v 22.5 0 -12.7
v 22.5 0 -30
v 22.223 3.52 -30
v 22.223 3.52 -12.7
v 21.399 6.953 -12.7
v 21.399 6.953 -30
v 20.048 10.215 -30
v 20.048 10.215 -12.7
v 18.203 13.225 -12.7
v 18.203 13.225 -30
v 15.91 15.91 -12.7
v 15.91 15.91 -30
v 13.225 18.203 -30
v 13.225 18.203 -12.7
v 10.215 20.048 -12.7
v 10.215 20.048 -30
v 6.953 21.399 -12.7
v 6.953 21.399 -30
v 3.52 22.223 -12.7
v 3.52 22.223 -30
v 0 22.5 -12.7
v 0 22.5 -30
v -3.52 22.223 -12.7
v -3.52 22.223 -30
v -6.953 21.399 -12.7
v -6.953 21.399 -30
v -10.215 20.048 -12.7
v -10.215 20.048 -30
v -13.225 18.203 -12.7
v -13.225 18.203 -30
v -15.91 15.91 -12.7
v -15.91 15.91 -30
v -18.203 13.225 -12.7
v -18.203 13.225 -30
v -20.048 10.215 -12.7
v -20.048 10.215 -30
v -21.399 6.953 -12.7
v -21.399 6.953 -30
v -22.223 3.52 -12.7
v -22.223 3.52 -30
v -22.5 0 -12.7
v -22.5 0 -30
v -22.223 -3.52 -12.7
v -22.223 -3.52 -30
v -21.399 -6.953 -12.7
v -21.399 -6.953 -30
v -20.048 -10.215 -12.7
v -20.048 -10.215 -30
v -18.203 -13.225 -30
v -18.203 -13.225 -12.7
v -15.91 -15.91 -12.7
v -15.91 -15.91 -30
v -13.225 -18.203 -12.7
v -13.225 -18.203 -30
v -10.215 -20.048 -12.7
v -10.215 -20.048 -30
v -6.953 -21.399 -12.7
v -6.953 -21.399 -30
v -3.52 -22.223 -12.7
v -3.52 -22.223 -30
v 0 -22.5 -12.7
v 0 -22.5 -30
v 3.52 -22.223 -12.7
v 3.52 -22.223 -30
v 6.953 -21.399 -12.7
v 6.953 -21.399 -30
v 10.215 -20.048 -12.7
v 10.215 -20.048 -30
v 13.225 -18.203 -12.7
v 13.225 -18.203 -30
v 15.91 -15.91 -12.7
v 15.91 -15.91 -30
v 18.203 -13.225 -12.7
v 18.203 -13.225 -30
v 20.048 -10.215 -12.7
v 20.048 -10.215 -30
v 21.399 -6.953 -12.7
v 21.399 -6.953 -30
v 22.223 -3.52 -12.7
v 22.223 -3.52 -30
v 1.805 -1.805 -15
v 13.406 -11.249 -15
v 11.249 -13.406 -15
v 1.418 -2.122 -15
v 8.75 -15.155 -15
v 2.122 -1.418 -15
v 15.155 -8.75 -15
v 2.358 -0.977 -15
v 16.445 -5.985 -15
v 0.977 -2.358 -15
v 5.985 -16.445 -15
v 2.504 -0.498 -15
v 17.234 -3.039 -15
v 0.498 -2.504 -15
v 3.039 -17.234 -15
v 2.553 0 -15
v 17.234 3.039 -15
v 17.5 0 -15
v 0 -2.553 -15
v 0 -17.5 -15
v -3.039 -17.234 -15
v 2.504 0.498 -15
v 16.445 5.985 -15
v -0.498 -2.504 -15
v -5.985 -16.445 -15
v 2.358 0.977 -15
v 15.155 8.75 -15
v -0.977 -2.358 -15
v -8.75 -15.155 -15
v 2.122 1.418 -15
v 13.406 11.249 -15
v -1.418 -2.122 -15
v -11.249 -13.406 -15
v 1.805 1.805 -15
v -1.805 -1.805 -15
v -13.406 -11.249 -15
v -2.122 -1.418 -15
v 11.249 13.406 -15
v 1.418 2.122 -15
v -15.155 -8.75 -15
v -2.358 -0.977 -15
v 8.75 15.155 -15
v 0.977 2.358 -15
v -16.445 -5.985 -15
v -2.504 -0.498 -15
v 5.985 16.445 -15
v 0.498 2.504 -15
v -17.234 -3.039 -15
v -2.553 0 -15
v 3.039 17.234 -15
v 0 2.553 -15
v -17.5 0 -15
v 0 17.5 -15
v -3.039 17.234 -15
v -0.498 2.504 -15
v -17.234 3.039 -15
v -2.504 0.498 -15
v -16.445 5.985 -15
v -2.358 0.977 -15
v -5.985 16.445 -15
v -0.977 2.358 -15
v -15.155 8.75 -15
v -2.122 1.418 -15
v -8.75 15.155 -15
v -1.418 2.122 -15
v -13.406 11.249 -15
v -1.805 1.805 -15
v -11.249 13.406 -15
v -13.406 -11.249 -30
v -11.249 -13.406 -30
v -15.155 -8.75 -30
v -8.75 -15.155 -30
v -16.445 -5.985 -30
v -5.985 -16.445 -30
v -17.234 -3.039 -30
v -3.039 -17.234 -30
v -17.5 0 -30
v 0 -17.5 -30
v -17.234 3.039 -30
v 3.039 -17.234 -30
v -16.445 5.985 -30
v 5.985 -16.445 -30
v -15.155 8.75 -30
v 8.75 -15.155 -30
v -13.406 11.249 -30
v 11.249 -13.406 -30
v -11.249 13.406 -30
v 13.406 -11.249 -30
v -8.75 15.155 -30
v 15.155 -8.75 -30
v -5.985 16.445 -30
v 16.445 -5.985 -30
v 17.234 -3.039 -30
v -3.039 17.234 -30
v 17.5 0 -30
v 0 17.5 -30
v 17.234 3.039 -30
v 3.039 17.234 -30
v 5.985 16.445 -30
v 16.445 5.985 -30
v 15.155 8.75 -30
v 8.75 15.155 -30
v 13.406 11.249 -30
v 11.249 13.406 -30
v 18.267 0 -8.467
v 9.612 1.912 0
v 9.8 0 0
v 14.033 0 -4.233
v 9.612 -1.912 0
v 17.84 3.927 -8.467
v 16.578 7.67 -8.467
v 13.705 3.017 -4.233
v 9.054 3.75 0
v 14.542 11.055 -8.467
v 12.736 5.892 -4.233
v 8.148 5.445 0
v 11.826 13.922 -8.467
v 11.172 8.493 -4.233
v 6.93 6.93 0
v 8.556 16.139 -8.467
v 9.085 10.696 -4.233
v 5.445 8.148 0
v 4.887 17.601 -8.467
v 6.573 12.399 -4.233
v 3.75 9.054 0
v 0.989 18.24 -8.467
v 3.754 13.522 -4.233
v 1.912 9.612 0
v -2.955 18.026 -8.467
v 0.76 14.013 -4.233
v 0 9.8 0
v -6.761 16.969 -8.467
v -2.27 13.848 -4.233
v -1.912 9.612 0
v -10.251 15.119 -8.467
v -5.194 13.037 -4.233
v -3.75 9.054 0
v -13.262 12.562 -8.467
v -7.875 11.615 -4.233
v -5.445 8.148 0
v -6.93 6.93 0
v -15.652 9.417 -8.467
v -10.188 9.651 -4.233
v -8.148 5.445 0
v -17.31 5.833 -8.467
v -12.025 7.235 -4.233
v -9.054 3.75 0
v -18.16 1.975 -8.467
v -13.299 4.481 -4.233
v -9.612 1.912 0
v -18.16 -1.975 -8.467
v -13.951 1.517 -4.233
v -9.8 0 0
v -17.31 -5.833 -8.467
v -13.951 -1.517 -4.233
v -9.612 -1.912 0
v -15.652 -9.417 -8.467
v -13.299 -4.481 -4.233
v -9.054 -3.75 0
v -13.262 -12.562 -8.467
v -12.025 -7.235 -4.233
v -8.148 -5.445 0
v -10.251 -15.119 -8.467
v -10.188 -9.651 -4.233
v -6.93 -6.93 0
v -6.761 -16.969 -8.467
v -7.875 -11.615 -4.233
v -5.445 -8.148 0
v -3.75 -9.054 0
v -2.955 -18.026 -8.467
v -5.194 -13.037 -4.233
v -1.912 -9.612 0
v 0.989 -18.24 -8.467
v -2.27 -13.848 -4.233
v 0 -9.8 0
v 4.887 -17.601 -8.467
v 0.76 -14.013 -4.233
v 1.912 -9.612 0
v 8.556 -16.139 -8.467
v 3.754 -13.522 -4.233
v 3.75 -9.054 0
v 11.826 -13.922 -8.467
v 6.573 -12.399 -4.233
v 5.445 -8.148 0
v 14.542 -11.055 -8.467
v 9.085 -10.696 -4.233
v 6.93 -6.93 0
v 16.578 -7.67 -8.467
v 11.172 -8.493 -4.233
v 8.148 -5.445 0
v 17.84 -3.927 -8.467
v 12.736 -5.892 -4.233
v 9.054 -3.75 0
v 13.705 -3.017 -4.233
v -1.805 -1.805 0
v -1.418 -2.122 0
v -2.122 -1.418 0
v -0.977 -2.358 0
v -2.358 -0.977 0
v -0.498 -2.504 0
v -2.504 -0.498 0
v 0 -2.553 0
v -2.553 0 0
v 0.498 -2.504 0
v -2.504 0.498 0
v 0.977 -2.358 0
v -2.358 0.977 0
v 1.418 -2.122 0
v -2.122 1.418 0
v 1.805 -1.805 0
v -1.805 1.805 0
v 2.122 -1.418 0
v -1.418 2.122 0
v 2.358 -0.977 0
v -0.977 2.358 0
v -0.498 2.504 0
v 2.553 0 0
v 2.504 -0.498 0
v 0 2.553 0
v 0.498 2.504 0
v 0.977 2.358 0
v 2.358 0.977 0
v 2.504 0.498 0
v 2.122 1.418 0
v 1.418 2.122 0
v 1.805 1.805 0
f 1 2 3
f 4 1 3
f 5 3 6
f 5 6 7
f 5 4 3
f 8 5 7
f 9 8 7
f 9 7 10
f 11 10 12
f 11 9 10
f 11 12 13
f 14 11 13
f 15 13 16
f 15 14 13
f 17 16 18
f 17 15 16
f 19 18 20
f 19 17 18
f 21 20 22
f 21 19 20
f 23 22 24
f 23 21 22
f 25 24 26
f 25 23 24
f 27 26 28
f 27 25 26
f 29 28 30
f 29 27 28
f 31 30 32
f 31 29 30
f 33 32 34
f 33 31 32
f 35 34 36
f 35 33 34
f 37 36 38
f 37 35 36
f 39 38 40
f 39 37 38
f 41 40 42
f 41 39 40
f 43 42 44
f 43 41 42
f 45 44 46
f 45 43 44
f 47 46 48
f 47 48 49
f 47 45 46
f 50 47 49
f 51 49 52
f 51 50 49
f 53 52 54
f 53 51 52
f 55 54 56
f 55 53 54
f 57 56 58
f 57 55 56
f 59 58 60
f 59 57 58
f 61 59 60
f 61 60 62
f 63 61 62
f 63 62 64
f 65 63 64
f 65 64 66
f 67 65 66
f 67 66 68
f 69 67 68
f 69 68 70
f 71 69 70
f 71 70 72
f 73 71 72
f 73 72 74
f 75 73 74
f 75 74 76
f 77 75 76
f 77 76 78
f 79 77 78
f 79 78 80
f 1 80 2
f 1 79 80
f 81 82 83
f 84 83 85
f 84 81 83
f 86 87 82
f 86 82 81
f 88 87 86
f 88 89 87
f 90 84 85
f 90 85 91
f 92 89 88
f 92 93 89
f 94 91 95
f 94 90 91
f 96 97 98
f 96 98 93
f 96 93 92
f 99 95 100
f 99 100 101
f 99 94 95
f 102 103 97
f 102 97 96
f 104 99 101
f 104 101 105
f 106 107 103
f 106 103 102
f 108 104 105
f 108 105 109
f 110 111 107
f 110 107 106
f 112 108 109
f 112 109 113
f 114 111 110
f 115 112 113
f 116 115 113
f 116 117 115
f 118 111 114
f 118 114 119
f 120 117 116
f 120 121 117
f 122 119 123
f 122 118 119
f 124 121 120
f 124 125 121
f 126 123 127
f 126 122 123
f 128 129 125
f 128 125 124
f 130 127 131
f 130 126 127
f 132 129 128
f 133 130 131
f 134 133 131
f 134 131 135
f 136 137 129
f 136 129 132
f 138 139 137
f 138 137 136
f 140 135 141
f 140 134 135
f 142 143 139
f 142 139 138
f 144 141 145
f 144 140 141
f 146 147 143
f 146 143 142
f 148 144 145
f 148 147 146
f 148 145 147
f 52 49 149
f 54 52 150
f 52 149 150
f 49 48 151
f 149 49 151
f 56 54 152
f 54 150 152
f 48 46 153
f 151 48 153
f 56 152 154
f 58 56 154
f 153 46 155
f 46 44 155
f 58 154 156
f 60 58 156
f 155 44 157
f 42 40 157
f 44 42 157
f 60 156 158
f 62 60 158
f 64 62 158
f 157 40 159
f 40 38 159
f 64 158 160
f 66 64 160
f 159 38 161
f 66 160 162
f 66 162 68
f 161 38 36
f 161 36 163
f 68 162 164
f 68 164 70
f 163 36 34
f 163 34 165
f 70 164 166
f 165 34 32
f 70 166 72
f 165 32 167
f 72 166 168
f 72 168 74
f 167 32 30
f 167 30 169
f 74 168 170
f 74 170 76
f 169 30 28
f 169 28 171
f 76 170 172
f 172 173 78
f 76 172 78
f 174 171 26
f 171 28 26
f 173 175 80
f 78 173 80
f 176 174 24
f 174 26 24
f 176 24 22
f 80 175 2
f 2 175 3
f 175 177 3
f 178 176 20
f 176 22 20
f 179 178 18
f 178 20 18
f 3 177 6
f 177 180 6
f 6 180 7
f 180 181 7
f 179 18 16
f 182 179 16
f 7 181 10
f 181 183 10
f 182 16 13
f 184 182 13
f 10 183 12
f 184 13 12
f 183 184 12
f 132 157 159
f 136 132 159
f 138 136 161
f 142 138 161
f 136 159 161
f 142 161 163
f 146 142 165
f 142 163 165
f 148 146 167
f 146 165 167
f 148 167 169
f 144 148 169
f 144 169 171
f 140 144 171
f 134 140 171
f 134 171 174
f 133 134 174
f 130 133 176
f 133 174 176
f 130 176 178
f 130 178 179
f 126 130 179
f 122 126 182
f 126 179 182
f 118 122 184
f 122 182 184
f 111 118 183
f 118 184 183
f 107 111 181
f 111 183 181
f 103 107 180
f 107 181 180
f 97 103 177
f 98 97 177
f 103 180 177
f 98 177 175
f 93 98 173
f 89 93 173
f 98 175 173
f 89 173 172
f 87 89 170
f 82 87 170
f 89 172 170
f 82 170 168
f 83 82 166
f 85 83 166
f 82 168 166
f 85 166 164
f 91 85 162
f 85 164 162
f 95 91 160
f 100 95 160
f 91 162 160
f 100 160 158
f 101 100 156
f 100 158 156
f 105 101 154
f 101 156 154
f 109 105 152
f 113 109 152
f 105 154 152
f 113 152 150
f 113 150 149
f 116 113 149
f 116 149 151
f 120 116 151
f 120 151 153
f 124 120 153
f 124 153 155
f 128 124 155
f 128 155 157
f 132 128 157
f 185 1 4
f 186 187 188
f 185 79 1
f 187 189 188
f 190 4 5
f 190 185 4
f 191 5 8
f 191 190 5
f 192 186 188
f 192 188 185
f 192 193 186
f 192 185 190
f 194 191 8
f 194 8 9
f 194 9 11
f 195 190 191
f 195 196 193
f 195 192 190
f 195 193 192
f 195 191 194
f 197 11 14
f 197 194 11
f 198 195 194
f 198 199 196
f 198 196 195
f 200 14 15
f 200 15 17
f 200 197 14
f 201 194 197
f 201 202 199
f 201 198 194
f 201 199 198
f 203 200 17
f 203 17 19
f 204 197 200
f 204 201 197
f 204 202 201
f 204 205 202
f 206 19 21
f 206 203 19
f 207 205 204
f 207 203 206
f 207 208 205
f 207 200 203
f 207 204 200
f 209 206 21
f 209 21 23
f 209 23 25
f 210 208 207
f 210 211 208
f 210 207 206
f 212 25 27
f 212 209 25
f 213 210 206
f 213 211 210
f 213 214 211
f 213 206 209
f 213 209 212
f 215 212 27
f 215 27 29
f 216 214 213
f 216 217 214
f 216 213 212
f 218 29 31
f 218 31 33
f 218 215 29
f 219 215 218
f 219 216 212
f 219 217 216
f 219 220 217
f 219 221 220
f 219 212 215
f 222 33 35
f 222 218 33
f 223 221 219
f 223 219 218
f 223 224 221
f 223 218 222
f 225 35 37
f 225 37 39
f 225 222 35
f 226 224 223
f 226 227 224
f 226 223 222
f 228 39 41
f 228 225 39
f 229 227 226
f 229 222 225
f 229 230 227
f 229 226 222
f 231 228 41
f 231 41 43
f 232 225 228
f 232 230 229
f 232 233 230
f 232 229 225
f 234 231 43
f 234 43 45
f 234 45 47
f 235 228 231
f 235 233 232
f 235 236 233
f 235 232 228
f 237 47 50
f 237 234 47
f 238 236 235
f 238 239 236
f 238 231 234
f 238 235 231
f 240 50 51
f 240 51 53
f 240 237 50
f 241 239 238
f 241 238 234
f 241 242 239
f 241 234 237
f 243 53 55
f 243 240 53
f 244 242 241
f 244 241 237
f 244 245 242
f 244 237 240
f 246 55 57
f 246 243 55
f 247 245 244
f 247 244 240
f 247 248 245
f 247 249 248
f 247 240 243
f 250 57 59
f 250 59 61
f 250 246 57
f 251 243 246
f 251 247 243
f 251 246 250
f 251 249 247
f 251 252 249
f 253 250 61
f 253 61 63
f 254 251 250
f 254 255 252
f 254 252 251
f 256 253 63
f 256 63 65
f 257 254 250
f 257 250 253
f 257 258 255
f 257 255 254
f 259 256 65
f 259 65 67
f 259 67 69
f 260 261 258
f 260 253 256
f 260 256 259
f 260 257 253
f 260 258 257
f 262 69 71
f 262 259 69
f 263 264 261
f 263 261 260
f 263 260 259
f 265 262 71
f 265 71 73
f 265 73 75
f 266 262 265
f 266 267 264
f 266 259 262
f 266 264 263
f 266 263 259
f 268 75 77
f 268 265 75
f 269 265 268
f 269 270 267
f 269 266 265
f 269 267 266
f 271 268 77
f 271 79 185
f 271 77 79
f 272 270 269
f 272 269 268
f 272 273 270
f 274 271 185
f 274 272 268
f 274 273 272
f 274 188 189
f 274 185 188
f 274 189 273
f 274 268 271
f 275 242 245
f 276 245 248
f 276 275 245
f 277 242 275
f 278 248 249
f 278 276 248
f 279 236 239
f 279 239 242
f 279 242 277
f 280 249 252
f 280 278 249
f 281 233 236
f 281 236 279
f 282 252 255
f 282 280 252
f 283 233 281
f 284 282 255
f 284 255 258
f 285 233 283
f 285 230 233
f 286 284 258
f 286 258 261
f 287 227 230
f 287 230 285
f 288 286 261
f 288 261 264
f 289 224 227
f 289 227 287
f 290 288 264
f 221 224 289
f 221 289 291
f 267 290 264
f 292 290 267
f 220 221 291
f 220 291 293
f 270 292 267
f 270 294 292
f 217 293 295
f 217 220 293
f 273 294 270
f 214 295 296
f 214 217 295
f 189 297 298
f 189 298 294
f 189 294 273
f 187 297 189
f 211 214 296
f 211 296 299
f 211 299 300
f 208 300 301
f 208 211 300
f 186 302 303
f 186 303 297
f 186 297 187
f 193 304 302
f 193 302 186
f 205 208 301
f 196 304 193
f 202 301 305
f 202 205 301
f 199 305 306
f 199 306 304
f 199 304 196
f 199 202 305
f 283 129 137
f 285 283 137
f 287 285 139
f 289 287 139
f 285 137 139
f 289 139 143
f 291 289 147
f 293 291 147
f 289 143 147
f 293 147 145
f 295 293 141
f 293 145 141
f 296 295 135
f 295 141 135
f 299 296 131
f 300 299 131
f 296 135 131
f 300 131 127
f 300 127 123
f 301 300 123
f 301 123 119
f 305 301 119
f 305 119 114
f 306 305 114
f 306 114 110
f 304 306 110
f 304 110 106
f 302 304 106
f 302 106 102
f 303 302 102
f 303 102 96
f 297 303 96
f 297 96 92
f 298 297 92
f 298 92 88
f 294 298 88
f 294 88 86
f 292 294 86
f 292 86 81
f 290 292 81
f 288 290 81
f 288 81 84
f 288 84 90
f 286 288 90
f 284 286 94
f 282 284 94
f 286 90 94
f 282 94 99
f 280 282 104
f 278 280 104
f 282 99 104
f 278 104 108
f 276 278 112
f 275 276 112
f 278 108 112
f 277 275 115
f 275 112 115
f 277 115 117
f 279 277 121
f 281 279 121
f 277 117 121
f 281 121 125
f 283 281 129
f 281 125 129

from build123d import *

# Parameters (mm, degrees)
SKETCH1_R               = 22.5
BOSS_EXTRUDE1_DEPTH     = 30
SKETCH2_R               = 17.5
CUT_EXTRUDE1_DEPTH      = 15
F_1_4_20_TAPPED_HOLE1_D = 5.1054
CHAMFER1_SIZE           = 12.7


with BuildPart() as part:
    # Sketch1 → Boss-Extrude1 (new body)
    with BuildSketch(Plane.XY):
        Circle(SKETCH1_R)
    extrude(amount=-BOSS_EXTRUDE1_DEPTH)

    # Sketch2 → Cut-Extrude1 (cut)
    with BuildSketch(Plane(origin=(0, 0, -30), x_dir=(-1, 0, 0), z_dir=(0, 0, -1))):
        Circle(SKETCH2_R)
    extrude(amount=-CUT_EXTRUDE1_DEPTH, mode=Mode.SUBTRACT)

    # 1/4-20 Tapped Hole1 (through all)
    with Locations(Plane.XY):
        with Locations((0, 0)):
            Hole(F_1_4_20_TAPPED_HOLE1_D / 2)

    # Chamfer1
    chamfer1_edges = [part.edges().sort_by_distance(p)[0] for p in [
        (-22.5, 0, 0),
    ]]
    chamfer(chamfer1_edges, length=CHAMFER1_SIZE)


solid = part.part
